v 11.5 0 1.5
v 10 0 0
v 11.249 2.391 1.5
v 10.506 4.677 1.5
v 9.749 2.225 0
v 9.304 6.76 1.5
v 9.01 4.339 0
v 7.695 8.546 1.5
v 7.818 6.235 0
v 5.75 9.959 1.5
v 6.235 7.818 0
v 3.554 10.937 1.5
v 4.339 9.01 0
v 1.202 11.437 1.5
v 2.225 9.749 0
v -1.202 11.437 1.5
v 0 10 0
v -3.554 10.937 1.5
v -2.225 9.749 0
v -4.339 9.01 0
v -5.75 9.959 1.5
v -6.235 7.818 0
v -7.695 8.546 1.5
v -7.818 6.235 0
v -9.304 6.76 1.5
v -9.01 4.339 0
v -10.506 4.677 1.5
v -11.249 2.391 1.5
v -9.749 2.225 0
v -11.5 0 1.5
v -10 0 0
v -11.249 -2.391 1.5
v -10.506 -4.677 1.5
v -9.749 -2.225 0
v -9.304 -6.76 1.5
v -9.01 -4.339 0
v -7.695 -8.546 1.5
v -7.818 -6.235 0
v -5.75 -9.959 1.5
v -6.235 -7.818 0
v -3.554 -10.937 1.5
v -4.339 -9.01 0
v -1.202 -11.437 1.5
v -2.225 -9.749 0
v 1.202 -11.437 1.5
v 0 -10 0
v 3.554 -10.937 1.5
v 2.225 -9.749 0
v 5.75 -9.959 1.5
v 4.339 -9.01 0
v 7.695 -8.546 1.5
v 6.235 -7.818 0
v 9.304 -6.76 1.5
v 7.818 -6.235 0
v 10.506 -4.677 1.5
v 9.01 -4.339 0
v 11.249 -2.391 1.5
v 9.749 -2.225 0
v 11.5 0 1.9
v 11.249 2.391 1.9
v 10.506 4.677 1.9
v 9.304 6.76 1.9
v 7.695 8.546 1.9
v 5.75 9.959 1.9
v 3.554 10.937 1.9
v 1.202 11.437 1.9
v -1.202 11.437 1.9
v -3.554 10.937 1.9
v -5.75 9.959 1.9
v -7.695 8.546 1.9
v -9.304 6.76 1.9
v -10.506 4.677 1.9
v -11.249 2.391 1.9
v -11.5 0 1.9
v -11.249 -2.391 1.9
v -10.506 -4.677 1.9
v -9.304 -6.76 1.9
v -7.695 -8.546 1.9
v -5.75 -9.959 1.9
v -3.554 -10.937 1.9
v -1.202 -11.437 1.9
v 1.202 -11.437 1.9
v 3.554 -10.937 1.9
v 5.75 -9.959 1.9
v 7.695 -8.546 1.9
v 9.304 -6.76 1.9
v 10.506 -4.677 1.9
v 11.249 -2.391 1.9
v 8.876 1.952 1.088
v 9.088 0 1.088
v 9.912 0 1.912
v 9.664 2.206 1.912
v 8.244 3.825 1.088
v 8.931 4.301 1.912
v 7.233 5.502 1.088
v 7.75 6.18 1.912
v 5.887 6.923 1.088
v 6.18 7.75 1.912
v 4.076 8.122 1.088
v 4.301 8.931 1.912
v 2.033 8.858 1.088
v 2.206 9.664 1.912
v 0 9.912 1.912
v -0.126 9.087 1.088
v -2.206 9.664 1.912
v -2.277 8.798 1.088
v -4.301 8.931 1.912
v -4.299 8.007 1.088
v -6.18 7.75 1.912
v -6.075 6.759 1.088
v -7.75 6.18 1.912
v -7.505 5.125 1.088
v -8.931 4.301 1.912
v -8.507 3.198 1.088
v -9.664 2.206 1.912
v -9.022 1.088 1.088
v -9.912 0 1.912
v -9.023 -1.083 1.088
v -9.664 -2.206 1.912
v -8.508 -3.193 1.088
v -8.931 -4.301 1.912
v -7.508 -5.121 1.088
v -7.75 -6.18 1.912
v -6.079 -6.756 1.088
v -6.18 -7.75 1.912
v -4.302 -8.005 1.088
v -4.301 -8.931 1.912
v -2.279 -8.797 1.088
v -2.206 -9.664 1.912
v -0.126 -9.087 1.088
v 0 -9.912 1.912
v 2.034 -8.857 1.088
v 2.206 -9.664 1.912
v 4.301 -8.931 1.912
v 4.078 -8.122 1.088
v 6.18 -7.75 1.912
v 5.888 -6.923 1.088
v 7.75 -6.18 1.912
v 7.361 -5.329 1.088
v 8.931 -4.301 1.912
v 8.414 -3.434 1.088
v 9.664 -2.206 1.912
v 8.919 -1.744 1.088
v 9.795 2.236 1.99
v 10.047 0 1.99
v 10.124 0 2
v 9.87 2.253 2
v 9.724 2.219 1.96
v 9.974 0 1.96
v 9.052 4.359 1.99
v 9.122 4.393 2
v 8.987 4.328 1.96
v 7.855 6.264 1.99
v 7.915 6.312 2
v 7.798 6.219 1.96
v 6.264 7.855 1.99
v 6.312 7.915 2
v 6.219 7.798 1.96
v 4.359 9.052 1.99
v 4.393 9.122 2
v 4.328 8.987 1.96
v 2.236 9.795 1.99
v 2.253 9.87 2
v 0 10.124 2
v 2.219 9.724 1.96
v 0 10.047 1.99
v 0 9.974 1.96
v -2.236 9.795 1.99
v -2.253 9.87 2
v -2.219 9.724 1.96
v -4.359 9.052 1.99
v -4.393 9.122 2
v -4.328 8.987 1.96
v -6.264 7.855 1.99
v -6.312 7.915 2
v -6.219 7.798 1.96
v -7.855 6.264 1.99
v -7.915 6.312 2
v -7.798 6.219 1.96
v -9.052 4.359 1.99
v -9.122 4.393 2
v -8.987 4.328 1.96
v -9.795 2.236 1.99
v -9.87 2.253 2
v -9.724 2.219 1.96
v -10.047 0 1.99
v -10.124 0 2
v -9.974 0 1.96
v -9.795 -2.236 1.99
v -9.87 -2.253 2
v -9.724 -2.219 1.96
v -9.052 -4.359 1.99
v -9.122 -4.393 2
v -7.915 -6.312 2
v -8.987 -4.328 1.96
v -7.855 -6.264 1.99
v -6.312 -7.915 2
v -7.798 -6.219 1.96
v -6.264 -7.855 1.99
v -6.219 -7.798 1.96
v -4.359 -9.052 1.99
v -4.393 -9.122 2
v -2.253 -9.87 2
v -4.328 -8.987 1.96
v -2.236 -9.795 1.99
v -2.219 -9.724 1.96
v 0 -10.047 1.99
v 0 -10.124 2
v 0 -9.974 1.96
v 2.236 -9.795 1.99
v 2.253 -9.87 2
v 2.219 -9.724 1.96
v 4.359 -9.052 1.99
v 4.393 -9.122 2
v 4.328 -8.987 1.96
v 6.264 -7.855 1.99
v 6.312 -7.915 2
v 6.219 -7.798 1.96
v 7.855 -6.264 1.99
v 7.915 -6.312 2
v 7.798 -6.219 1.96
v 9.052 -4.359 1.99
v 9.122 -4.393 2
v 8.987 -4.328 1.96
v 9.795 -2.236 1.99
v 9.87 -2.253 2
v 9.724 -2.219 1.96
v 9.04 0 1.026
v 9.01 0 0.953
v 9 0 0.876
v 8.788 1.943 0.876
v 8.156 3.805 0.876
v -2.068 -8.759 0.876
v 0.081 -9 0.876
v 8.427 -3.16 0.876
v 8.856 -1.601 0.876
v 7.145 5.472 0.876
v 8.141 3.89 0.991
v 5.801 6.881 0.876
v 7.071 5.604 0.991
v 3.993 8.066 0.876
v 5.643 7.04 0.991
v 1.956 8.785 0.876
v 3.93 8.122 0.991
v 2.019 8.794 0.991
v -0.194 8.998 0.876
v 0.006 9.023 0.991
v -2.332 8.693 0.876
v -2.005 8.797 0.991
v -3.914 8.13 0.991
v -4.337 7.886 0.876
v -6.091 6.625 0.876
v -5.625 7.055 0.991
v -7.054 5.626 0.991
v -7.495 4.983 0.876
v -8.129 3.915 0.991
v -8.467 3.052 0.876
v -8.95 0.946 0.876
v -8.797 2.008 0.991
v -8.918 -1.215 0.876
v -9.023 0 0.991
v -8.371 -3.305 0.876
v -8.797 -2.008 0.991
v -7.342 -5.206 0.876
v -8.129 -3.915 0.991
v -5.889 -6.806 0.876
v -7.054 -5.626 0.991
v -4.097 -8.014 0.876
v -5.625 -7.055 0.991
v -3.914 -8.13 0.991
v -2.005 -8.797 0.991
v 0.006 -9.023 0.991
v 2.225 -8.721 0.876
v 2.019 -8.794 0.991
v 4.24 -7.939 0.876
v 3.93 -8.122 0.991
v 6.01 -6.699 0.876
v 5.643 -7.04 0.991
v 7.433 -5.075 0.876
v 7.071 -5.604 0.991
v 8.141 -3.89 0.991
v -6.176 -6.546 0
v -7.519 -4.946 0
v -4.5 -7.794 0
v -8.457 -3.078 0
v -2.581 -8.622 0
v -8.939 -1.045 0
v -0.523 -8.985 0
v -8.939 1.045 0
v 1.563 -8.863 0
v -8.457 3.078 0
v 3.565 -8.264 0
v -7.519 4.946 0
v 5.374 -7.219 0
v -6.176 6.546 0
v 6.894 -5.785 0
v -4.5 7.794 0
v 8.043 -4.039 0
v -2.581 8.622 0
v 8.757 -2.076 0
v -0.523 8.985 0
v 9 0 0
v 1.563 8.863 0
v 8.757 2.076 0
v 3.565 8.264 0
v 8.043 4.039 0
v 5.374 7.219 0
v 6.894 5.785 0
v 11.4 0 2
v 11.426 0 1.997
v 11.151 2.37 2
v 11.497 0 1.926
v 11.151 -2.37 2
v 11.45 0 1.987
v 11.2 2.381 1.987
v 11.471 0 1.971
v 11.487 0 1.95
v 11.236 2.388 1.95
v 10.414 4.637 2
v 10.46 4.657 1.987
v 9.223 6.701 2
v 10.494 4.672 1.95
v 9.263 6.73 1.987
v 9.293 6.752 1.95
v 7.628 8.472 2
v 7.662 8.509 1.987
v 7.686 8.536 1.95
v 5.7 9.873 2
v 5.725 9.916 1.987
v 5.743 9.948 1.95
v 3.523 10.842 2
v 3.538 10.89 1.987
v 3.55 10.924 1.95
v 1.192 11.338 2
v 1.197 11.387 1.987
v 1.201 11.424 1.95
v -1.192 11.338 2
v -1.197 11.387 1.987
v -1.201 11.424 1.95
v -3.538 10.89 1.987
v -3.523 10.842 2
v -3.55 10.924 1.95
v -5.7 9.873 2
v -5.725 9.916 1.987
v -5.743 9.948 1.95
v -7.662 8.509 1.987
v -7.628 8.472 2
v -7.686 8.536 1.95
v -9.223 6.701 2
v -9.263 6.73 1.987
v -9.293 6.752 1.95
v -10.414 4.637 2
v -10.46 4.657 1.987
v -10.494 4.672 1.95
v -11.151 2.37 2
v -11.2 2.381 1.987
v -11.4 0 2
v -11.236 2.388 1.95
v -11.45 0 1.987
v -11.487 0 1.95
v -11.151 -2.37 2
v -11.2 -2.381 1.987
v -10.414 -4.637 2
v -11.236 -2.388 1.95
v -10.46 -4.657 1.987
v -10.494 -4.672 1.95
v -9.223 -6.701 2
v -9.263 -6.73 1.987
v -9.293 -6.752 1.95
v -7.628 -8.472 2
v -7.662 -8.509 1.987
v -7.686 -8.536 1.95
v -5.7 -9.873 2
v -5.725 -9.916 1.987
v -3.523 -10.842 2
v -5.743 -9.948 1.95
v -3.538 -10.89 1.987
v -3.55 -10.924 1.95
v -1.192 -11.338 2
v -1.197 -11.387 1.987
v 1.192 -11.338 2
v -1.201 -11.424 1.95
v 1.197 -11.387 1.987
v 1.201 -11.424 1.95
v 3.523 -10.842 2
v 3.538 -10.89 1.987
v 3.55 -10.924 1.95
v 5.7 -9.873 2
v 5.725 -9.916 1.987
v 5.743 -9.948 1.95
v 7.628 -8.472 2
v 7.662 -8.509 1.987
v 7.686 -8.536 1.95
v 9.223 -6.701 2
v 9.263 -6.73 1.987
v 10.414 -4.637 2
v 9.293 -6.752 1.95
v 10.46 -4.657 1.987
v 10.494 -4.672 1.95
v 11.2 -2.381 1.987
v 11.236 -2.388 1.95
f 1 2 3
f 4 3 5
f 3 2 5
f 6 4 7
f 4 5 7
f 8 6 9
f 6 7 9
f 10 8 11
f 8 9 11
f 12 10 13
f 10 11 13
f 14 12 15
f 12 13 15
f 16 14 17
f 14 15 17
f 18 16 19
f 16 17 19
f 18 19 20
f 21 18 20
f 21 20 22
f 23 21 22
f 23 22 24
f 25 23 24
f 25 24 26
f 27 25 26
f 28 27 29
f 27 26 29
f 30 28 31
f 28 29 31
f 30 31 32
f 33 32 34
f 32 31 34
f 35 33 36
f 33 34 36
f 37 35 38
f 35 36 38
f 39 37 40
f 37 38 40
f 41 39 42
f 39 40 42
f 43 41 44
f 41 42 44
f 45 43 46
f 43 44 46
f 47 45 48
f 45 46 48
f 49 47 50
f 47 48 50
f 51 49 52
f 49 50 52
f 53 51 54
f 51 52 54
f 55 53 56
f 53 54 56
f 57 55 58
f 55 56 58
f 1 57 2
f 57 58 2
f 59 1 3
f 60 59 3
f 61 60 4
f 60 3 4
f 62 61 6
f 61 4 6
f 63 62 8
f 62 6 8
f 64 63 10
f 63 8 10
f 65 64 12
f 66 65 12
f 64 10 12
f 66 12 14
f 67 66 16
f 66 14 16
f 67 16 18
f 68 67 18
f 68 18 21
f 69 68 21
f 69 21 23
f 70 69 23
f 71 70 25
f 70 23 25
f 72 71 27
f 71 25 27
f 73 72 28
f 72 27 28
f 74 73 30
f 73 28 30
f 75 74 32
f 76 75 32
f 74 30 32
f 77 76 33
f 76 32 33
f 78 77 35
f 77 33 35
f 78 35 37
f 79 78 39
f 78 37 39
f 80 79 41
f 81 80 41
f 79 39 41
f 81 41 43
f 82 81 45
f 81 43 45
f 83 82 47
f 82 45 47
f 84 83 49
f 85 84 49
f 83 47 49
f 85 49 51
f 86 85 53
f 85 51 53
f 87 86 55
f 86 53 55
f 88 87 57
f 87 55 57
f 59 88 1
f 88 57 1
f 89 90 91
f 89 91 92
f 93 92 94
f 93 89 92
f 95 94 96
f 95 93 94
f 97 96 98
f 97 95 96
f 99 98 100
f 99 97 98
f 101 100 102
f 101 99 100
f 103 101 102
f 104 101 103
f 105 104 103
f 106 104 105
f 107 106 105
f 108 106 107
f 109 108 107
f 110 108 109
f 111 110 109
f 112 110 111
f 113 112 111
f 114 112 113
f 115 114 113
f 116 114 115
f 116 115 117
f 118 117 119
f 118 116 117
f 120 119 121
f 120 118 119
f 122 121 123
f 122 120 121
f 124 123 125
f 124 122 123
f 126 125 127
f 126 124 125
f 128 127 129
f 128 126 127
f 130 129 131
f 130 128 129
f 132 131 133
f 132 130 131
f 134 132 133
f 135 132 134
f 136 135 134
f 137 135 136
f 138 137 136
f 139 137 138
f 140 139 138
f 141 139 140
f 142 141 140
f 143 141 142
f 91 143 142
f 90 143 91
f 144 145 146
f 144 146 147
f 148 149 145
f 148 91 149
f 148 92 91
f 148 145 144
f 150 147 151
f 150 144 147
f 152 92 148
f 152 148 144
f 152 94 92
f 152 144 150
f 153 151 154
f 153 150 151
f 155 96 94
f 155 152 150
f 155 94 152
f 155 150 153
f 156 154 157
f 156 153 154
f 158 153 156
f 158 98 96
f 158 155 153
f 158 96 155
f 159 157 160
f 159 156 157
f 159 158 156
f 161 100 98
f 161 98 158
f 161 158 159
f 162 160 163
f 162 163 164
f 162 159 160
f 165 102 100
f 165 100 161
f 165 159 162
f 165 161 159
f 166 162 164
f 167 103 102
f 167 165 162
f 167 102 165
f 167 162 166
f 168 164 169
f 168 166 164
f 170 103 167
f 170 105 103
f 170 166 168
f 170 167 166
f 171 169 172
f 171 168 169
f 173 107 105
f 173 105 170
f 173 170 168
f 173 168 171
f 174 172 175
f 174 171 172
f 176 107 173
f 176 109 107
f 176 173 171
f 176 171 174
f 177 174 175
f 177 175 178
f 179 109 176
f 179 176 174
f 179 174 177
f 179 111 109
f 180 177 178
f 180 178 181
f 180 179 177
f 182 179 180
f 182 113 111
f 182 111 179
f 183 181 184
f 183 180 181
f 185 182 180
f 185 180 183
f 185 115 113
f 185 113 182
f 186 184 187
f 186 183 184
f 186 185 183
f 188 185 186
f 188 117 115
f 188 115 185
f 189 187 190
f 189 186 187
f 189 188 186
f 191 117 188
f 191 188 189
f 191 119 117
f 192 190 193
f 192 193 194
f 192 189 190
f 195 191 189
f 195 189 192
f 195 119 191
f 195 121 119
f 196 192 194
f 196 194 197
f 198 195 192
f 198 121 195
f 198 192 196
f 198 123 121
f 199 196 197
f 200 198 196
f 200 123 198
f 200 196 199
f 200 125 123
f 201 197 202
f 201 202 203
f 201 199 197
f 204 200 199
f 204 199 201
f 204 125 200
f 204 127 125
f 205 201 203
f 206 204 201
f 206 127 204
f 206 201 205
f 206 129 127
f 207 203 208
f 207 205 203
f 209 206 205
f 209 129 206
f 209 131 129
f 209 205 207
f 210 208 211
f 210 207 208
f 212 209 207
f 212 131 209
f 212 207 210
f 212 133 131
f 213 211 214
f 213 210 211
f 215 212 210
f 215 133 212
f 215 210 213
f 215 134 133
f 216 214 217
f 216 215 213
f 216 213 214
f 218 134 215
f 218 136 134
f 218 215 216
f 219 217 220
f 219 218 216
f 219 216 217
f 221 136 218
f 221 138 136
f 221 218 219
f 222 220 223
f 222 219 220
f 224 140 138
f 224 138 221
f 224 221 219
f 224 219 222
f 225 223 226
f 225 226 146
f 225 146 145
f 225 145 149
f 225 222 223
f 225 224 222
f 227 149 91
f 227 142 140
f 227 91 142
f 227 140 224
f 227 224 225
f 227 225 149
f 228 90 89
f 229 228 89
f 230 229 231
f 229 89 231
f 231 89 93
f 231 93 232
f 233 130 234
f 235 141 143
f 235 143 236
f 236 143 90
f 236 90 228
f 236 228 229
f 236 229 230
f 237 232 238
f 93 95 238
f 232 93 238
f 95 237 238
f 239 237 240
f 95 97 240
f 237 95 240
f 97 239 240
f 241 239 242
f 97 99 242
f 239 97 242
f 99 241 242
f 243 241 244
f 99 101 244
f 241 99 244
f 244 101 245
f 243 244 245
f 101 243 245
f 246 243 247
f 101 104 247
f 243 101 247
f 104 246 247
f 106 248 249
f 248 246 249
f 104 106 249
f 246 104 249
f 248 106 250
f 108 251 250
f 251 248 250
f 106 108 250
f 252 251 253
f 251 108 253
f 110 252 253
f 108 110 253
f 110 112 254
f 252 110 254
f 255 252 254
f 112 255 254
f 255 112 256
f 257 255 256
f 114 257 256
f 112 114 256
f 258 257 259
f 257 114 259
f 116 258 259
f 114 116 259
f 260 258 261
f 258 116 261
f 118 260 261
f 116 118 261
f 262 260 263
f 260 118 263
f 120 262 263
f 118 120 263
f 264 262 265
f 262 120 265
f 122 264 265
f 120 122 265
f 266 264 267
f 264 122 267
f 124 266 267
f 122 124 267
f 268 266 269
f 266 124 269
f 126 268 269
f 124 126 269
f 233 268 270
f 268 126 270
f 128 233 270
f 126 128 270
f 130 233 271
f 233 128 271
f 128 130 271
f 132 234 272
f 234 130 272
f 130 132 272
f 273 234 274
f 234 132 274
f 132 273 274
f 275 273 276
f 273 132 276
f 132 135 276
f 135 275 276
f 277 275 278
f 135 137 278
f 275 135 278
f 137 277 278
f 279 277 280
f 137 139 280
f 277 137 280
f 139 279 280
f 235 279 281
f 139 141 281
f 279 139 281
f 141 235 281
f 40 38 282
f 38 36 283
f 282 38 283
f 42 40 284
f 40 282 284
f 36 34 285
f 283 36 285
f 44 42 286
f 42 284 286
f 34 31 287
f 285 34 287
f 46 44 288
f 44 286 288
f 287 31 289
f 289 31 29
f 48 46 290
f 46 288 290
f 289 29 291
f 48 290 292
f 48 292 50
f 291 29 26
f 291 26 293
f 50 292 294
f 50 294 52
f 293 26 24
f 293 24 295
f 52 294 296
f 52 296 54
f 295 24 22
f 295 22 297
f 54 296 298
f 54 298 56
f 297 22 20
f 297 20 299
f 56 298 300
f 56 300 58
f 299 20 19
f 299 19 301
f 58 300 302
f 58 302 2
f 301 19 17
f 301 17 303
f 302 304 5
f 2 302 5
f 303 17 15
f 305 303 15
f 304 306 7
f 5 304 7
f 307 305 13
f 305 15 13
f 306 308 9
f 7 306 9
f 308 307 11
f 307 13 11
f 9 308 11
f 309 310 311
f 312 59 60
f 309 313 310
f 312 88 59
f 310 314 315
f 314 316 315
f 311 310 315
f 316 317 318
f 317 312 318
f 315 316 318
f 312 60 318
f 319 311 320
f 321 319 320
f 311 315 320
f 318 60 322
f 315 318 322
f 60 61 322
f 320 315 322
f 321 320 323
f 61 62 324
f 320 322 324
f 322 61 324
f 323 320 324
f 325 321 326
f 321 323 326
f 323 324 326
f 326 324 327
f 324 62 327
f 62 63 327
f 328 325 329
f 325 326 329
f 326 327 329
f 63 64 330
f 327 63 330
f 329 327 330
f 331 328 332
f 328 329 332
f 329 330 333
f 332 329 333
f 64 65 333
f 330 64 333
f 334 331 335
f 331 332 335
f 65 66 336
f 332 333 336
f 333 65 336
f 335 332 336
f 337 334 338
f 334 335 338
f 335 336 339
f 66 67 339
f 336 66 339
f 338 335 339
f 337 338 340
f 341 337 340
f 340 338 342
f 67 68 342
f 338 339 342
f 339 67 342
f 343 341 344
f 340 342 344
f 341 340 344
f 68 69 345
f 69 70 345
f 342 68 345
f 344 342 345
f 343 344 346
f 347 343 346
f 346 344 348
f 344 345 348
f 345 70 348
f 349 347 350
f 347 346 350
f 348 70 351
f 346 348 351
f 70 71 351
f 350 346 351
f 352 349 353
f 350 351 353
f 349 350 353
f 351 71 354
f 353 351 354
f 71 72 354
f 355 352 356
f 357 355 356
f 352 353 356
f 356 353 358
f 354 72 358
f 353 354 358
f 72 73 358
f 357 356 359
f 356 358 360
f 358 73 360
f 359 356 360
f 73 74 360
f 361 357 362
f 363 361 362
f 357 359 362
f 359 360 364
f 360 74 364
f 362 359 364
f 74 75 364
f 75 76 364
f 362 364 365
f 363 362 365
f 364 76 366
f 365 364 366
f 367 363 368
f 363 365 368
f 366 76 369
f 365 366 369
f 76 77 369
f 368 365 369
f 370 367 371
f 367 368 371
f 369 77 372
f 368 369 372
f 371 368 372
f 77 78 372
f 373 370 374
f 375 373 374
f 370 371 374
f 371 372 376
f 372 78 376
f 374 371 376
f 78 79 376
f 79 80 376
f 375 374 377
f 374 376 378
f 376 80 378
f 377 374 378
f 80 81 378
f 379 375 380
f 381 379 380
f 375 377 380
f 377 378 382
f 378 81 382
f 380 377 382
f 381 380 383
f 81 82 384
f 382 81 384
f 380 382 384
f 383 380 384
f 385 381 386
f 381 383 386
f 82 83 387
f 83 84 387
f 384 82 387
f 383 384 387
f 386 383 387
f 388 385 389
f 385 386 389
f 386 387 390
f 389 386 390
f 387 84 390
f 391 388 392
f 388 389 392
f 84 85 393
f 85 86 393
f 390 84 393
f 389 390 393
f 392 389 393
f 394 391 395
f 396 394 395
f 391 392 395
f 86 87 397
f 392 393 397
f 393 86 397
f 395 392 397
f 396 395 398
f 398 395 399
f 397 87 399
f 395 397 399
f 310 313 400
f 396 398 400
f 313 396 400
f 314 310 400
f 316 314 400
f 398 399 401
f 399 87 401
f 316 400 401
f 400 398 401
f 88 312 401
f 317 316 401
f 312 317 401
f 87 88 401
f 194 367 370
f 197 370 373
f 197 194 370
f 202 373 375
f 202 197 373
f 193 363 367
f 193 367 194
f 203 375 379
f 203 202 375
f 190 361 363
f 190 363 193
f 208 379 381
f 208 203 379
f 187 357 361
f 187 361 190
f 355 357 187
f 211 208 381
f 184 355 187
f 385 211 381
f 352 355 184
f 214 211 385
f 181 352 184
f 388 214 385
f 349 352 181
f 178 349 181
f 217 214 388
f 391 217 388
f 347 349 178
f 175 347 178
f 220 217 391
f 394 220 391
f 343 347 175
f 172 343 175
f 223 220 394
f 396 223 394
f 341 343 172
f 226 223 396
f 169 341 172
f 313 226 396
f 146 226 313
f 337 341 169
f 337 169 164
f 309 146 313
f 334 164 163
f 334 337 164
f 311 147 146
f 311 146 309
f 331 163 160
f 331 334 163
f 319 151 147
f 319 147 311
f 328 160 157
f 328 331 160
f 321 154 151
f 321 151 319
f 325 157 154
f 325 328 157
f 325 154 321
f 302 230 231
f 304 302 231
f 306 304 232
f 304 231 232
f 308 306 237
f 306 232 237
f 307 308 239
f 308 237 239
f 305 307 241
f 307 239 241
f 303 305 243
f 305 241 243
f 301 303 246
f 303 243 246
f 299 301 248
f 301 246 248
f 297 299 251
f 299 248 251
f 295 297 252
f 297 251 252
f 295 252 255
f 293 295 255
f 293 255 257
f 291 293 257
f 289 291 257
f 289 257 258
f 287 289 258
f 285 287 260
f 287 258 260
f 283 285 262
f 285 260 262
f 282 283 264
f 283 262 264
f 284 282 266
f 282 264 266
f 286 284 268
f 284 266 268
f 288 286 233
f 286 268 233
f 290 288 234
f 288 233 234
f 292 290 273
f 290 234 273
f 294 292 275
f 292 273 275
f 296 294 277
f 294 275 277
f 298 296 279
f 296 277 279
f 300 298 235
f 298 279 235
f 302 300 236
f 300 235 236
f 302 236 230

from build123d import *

# Parameters (mm, degrees)
SKETCH1_R           = 11.5
BOSS_EXTRUDE1_DEPTH = 2
CHAMFER1_SIZE       = 1.5
SKETCH3_R           = 9
CUT_EXTRUDE1_DEPTH  = 2
CHAMFER2_SIZE       = 1
FILLET1_R           = 0.3
FILLET2_R           = 0.1


with BuildPart() as part:
    # Sketch1 → Boss-Extrude1 (new body)
    with BuildSketch(Plane.XY):
        Circle(SKETCH1_R)
    extrude(amount=BOSS_EXTRUDE1_DEPTH)

    # Chamfer1
    chamfer1_edges = [part.edges().sort_by_distance(p)[0] for p in [
        (-11.5, 0, 0),
    ]]
    chamfer(chamfer1_edges, length=CHAMFER1_SIZE)

    # Sketch3 → Cut-Extrude1 (cut)
    with BuildSketch(Plane.XY.offset(2)):
        Circle(SKETCH3_R)
    extrude(amount=-CUT_EXTRUDE1_DEPTH, mode=Mode.SUBTRACT)

    # Chamfer2
    chamfer2_edges = [part.edges().sort_by_distance(p)[0] for p in [
        (-9, 0, 2),
    ]]
    chamfer(chamfer2_edges, length=CHAMFER2_SIZE)

    # Fillet1
    fillet1_edges = [part.edges().sort_by_distance(p)[0] for p in [
        (-9, 0, 1),
        (-10, 0, 2),
    ]]
    fillet(fillet1_edges, radius=FILLET1_R)

    # Fillet2
    fillet2_edges = [part.edges().sort_by_distance(p)[0] for p in [
        (-11.5, 0, 2),
    ]]
    fillet(fillet2_edges, radius=FILLET2_R)


solid = part.part
